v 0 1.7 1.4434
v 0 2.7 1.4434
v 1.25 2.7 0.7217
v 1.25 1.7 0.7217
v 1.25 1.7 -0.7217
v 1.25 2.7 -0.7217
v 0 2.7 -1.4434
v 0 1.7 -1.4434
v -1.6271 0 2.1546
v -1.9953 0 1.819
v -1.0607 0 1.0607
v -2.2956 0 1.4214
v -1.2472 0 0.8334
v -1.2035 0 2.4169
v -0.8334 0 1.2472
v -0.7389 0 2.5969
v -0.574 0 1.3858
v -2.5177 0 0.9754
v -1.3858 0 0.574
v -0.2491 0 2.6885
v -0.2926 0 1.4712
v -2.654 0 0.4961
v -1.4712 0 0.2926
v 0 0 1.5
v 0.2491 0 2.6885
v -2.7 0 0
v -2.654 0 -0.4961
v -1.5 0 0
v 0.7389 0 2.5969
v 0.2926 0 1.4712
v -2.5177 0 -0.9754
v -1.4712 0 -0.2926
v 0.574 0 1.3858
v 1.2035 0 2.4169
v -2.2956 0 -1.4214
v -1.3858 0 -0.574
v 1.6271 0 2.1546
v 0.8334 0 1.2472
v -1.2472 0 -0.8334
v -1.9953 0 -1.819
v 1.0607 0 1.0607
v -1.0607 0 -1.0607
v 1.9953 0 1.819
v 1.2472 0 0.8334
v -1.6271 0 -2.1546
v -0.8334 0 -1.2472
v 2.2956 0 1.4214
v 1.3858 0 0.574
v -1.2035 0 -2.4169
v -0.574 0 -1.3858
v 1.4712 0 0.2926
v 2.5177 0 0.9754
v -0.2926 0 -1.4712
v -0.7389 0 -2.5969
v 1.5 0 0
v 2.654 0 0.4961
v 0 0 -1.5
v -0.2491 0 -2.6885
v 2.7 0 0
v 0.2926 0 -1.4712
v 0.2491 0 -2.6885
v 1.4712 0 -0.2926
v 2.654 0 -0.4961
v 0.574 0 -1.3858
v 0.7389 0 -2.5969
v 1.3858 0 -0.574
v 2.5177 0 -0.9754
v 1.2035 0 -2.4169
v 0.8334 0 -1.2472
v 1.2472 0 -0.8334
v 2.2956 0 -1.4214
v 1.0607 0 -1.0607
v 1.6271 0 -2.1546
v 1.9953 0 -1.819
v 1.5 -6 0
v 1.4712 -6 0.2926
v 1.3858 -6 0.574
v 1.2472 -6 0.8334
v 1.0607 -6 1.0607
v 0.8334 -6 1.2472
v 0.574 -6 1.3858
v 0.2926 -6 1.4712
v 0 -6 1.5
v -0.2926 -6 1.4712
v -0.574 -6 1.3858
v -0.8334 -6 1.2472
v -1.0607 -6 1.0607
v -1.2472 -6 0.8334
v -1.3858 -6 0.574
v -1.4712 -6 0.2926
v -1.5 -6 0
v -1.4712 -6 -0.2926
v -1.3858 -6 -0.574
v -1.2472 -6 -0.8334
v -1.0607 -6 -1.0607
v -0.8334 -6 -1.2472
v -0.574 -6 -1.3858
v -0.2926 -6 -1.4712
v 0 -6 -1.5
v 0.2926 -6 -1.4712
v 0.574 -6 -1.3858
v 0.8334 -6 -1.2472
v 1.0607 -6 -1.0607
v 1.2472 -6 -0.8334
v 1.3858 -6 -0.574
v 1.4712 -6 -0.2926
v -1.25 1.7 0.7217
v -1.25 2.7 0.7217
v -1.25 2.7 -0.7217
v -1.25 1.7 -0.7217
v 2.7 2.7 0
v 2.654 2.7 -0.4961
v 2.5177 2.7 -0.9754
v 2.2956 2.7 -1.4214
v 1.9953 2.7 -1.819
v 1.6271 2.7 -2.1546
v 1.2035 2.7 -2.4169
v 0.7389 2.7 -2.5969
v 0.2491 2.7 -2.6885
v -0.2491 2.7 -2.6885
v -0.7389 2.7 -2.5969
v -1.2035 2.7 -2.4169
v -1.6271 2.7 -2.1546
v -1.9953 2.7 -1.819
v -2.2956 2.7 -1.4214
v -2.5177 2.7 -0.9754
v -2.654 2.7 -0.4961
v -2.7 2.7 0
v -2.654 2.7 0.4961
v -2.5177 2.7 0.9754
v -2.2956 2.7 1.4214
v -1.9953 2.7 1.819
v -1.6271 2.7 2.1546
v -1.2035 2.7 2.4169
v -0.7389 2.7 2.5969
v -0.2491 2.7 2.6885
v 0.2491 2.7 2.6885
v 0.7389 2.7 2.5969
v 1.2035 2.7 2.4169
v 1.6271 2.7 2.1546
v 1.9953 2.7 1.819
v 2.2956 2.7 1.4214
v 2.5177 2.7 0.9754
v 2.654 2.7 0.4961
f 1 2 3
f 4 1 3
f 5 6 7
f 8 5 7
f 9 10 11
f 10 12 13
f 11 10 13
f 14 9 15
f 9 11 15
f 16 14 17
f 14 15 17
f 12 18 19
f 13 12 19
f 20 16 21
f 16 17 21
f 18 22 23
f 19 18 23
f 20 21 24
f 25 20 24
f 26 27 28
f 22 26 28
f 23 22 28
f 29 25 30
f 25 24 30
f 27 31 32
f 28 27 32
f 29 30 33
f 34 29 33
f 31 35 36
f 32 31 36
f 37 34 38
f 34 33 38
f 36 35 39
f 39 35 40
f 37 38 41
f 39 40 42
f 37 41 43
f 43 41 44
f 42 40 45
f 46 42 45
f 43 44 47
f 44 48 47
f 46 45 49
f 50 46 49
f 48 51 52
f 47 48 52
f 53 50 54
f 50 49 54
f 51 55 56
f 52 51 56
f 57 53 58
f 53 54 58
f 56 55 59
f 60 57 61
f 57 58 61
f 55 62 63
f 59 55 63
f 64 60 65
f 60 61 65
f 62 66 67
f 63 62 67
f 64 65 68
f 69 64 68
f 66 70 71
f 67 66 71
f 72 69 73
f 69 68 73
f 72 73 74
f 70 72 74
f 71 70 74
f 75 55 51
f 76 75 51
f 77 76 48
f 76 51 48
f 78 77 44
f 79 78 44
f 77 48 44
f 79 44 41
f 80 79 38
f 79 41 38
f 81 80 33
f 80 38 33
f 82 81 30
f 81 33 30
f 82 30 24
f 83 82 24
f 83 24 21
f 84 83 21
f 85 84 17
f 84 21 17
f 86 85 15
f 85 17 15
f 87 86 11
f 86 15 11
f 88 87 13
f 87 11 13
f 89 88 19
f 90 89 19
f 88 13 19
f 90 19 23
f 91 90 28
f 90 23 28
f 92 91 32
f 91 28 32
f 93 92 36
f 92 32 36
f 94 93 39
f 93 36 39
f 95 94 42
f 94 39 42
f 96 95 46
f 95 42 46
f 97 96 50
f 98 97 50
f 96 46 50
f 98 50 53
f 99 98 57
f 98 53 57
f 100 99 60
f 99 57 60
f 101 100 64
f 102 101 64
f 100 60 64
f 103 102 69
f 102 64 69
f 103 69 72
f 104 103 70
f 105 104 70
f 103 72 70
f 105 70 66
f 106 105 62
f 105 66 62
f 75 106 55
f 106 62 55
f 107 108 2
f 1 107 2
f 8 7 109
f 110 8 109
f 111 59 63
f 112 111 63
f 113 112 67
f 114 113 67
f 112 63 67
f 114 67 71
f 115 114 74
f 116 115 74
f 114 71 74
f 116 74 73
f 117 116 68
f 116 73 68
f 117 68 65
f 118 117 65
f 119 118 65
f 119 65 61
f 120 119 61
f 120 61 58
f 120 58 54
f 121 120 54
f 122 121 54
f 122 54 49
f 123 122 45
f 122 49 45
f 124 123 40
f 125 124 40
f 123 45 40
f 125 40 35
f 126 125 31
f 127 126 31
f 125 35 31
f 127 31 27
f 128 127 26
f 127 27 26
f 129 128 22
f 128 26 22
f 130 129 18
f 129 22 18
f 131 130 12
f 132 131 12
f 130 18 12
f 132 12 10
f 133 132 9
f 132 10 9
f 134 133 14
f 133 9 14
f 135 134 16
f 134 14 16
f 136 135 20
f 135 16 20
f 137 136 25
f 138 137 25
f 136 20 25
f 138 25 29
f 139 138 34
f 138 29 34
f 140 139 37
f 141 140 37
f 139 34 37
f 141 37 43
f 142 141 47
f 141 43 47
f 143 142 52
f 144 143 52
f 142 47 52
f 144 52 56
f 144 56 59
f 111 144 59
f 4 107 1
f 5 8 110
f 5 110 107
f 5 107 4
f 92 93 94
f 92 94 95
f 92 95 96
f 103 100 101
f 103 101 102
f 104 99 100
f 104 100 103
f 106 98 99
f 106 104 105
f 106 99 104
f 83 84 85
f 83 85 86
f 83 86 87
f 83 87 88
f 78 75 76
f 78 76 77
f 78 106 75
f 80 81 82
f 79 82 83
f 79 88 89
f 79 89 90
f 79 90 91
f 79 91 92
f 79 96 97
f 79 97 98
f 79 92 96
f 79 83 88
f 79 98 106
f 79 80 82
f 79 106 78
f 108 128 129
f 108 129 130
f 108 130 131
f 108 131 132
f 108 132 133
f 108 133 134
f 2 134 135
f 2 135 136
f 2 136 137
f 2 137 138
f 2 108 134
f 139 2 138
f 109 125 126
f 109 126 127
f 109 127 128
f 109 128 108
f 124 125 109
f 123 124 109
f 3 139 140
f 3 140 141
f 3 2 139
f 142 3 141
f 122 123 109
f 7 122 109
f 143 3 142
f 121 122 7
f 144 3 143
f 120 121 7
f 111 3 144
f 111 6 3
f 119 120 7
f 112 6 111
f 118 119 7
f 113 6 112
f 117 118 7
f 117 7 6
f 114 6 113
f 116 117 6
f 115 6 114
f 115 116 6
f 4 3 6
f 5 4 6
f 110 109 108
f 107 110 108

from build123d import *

# Parameters (mm, degrees)
SKETCH1_R           = 2.7
BOSS_EXTRUDE1_DEPTH = 2.7
CUT_EXTRUDE1_DEPTH  = 1
SKETCH3_R           = 1.5
BOSS_EXTRUDE2_DEPTH = 6


with BuildPart() as part:
    # Sketch1 → Boss-Extrude1 (new body)
    with BuildSketch(Plane(origin=(0, 0, 0), x_dir=(1, 0, 0), z_dir=(0, 1, 0))):
        Circle(SKETCH1_R)
    extrude(amount=BOSS_EXTRUDE1_DEPTH)

    # Sketch2 → Cut-Extrude1 (cut)
    with BuildSketch(Plane(origin=(0, 2.7, 0), x_dir=(1, 0, 0), z_dir=(0, 1, 0))):
        Polygon((0, 1.443375673), (-1.25, 0.721687836), (-1.25, -0.721687836), (0, -1.443375673), (1.25, -0.721687836), (1.25, 0.721687836), align=None)
    extrude(amount=-CUT_EXTRUDE1_DEPTH, mode=Mode.SUBTRACT)

    # Sketch3 → Boss-Extrude2 (add)
    with BuildSketch(Plane.XZ):
        Circle(SKETCH3_R)
    extrude(amount=BOSS_EXTRUDE2_DEPTH)


solid = part.part
